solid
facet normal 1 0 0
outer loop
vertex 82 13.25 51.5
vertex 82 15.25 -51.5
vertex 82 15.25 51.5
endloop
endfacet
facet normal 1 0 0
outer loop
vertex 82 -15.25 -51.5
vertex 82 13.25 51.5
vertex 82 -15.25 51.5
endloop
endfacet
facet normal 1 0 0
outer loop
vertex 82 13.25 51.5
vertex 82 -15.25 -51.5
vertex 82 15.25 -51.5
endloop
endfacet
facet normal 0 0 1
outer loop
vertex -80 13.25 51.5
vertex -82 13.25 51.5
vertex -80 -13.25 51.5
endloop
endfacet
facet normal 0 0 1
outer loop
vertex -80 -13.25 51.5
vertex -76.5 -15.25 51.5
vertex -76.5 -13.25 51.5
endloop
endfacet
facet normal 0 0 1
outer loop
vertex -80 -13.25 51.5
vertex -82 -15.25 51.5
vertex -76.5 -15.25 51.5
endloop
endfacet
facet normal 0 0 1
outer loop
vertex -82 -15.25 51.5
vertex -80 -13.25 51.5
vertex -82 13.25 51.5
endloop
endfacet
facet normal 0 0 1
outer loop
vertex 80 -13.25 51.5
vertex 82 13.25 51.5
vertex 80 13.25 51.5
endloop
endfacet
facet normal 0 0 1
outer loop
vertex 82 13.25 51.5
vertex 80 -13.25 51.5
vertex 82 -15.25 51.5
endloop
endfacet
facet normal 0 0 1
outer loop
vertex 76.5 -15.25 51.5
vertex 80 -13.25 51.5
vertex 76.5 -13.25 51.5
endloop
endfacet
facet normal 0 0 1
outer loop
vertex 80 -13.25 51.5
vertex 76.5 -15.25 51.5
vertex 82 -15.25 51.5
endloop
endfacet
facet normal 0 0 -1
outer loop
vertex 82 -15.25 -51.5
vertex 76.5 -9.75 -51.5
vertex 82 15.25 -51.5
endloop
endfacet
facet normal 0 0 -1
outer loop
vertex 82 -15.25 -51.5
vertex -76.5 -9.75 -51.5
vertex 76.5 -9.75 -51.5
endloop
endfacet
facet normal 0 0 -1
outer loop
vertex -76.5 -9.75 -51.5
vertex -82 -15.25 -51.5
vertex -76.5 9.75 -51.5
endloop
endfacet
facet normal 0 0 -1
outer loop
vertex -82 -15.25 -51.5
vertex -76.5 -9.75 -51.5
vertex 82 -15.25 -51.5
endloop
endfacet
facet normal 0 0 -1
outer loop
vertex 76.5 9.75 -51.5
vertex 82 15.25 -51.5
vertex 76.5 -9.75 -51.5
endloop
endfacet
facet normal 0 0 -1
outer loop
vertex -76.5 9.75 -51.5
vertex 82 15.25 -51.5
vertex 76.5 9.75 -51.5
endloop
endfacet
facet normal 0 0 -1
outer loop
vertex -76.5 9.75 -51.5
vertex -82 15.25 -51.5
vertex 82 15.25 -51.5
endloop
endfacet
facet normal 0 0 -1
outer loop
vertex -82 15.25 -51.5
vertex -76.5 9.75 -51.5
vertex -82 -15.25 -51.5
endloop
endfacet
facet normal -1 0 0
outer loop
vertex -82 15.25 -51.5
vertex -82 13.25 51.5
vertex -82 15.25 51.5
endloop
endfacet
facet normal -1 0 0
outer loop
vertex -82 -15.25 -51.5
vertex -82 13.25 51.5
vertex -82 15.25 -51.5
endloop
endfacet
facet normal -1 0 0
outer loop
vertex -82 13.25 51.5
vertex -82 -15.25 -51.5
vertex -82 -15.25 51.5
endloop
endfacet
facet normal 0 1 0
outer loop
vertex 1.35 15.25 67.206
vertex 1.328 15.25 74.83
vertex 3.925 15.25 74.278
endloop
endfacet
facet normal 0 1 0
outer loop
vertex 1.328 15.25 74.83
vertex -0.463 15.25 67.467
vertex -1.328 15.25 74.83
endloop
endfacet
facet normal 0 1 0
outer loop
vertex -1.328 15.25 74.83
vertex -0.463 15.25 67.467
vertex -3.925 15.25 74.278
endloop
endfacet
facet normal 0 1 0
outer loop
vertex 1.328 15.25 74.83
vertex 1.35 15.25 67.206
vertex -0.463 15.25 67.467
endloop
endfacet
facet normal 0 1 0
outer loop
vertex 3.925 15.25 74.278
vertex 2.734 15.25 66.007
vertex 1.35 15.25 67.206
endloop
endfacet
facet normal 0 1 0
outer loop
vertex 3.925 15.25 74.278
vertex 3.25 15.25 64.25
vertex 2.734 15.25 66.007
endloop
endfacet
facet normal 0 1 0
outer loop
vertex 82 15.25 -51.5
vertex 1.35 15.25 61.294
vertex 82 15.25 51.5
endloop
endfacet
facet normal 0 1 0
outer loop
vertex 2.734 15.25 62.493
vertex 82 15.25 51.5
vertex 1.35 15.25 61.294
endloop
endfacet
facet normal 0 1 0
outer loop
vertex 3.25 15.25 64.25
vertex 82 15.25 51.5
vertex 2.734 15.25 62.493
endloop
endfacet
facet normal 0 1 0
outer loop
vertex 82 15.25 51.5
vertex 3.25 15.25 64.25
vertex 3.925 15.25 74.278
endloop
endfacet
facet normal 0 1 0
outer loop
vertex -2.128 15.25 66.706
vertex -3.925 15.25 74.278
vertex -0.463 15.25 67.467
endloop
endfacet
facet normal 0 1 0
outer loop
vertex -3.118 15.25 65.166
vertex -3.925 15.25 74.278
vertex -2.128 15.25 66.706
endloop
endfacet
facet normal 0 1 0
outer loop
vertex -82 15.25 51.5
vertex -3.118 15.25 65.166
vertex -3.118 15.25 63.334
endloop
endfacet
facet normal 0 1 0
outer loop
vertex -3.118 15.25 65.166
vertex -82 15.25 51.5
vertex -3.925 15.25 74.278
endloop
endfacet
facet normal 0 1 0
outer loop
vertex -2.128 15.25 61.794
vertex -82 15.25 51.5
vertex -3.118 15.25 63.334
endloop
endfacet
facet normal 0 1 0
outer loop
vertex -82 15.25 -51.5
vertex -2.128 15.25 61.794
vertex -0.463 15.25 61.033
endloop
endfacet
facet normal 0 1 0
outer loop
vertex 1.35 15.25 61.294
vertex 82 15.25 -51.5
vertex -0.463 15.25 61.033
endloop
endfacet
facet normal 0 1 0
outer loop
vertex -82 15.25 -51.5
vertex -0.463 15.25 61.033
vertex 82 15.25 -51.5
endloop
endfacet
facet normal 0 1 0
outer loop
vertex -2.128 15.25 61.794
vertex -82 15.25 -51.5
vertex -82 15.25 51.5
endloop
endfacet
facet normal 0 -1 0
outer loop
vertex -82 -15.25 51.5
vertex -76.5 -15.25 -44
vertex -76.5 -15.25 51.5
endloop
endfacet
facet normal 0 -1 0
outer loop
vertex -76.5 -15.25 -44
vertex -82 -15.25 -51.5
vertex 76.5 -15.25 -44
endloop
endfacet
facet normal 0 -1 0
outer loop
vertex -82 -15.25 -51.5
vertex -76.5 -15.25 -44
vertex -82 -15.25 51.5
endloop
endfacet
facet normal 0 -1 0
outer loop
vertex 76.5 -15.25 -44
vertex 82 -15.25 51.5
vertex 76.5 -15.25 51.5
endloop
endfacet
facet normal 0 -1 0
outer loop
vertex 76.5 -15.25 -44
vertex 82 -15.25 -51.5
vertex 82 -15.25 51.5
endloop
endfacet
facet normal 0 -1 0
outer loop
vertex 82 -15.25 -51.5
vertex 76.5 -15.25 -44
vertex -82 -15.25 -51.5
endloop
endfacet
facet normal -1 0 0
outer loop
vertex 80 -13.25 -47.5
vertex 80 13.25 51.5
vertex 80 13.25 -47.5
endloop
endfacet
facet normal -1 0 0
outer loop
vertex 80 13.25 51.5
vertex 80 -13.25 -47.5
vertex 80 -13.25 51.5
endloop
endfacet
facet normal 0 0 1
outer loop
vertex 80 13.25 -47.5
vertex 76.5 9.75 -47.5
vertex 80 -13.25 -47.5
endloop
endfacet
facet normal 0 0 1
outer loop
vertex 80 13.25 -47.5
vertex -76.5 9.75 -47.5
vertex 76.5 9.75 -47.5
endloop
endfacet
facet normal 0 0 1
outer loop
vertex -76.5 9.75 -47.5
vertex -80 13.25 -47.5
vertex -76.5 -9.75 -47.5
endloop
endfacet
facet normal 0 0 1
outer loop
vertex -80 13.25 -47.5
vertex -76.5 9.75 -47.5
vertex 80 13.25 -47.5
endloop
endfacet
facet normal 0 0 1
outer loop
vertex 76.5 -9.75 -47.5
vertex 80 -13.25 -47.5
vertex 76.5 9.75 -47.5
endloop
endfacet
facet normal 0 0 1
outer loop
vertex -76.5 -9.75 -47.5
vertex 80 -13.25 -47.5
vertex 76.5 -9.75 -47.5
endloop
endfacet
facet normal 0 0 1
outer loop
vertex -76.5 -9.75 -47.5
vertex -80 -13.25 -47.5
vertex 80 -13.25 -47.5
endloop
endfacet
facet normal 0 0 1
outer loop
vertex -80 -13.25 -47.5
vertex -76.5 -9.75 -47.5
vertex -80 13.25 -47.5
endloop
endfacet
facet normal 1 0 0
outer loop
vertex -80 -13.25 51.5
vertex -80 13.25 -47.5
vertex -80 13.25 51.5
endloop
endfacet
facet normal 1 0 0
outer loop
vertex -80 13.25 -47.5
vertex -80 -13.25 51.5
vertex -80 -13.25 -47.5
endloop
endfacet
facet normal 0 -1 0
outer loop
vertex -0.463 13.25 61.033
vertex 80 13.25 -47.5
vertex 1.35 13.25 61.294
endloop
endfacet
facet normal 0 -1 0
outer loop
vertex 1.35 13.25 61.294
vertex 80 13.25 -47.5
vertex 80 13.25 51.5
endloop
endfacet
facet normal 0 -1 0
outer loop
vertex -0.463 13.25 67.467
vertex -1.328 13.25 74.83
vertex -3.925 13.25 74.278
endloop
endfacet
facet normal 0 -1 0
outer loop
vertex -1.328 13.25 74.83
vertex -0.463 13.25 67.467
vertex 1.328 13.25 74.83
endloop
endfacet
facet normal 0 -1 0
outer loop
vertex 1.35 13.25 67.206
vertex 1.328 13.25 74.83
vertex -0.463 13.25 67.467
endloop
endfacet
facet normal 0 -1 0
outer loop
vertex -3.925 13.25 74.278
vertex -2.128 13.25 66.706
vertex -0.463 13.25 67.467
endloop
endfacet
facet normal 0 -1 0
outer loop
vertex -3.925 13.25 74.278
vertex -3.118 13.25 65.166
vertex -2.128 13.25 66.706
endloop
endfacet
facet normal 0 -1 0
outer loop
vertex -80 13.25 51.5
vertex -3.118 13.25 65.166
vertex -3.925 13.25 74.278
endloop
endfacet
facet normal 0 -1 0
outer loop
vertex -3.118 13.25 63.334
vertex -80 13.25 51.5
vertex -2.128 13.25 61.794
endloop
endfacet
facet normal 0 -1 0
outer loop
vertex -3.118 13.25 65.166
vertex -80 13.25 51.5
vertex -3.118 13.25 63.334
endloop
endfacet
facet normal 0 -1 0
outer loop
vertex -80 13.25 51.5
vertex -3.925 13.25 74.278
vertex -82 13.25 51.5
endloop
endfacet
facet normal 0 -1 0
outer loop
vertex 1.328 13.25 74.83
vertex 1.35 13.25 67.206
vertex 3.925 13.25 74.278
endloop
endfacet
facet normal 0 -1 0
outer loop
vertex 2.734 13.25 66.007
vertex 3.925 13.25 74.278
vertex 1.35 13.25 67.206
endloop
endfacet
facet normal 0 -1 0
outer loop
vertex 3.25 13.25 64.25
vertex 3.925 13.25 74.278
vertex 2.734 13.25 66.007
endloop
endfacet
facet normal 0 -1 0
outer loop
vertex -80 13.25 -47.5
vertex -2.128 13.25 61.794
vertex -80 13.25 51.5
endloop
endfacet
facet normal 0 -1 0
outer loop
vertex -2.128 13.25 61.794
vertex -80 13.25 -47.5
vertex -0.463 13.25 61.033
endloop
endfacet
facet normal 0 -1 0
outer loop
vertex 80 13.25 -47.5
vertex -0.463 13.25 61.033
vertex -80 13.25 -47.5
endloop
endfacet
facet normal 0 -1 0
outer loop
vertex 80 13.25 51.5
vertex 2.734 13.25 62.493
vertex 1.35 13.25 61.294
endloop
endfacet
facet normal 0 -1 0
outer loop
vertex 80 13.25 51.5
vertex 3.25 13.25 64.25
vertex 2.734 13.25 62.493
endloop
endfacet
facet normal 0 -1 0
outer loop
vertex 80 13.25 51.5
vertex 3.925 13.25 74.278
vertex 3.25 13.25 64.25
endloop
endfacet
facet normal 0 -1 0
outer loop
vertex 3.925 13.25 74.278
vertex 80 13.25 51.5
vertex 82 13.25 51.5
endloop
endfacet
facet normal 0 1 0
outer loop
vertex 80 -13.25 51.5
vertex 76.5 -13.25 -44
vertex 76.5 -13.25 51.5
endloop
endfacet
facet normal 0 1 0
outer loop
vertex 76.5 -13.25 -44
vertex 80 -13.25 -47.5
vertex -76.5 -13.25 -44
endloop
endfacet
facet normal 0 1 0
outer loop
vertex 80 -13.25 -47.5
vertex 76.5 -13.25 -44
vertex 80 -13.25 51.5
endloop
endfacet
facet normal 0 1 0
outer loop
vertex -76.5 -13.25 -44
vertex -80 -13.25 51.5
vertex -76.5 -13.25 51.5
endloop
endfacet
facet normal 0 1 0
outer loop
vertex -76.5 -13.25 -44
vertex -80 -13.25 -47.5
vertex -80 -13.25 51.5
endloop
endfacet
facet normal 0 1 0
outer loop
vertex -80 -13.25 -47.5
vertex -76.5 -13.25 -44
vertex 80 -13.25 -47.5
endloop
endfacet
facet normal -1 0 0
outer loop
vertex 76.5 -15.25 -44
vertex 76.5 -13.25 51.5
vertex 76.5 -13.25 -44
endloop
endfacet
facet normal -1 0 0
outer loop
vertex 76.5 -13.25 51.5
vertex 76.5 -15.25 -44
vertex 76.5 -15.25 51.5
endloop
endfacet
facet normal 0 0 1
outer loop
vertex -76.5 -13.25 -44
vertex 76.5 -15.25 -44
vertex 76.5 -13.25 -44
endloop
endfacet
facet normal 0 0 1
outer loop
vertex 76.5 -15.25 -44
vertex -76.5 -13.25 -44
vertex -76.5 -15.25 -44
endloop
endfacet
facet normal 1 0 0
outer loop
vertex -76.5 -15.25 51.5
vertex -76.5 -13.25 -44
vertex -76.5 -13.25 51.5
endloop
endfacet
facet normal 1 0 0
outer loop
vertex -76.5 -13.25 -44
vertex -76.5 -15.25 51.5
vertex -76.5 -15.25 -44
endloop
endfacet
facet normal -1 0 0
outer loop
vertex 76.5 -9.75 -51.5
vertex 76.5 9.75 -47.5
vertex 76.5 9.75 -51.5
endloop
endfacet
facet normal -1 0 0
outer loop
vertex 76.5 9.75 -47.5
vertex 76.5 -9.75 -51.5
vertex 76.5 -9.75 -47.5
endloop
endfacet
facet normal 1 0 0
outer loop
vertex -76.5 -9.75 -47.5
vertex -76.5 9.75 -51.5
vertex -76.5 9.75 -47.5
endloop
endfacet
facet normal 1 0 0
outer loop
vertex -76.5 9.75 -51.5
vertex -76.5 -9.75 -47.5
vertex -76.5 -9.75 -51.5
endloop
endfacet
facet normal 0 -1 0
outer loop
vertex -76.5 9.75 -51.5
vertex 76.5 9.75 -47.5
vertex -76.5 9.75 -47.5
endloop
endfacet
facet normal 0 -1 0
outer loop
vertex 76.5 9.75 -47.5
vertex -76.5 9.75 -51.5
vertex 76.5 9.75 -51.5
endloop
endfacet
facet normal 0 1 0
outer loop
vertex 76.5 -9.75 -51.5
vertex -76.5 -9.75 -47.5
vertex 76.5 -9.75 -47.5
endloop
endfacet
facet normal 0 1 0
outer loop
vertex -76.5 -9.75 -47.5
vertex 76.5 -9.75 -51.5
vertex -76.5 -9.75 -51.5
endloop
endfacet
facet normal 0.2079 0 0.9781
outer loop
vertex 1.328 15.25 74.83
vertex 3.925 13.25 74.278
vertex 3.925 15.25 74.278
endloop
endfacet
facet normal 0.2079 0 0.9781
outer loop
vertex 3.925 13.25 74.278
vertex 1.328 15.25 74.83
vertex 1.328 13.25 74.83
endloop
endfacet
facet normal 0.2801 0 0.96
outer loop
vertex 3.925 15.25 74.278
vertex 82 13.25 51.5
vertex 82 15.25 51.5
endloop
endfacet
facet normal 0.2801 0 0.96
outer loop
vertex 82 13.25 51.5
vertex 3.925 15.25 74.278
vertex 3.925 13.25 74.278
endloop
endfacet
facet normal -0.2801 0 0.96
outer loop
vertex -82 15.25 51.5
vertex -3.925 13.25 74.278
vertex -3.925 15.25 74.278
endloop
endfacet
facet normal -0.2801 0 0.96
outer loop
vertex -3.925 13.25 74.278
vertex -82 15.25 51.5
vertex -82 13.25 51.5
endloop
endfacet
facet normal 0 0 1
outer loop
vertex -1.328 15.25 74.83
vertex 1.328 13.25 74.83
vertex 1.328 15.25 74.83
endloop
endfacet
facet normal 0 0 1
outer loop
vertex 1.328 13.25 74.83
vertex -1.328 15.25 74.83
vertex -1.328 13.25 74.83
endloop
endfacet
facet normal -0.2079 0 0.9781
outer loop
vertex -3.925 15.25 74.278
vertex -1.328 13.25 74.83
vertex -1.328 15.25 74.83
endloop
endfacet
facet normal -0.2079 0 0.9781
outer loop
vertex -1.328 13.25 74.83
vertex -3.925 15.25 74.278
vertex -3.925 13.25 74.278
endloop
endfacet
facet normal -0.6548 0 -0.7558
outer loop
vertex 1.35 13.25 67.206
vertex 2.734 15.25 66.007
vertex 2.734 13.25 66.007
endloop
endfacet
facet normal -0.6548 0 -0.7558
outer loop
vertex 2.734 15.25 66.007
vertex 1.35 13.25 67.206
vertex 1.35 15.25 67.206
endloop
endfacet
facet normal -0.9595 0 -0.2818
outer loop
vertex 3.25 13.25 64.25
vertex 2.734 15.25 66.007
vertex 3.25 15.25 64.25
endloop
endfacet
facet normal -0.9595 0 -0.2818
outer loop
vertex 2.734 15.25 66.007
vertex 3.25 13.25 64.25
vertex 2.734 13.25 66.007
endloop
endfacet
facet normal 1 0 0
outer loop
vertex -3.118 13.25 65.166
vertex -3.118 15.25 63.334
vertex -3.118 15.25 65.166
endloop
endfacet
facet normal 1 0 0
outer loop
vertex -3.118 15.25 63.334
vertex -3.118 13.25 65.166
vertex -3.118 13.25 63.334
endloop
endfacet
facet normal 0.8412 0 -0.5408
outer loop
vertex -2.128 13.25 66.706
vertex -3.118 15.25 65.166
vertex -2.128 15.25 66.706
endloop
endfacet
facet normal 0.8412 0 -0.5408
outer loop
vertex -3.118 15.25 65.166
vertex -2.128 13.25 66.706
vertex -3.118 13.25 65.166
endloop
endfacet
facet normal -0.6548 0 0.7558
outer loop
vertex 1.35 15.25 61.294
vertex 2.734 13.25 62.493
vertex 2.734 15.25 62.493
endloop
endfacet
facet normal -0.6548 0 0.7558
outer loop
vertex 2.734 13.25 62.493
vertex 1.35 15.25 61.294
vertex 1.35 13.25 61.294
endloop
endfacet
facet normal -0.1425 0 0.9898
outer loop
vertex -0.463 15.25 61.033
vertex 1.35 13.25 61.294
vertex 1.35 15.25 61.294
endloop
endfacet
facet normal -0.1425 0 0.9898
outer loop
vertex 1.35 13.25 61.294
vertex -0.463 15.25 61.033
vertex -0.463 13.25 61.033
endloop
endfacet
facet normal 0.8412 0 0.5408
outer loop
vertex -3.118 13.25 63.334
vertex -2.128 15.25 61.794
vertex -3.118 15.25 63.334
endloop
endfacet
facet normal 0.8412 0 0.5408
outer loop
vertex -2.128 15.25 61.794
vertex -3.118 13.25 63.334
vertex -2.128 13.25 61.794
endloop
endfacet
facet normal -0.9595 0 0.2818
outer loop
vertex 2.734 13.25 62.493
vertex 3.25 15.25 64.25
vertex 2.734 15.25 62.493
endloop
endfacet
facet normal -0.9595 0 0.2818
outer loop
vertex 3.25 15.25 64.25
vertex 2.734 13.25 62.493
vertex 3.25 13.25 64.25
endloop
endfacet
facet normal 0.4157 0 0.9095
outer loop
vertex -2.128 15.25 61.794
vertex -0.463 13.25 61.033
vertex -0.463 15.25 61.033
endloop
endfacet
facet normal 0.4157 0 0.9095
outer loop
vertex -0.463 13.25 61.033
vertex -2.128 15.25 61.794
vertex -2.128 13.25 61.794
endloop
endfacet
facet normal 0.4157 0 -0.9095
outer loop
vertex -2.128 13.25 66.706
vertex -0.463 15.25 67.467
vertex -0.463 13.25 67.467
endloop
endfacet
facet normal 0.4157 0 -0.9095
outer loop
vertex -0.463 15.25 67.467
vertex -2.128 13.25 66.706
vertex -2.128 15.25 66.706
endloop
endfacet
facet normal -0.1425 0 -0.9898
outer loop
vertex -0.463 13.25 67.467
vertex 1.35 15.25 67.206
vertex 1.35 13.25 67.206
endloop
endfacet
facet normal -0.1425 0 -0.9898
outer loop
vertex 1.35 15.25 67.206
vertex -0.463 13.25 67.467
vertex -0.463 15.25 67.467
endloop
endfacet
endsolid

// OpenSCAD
//Streaming Device TV Mount

//by replayreb
//GPL License

//https://www.thingiverse.com/thing:3255257

//(in mm)
wall_thickness = 2;

mounting_hole_diameter = 6.5;

device_width = 160;
//(depth = length of device from front to back)
device_depth = 99;
device_height = 26.5;

//(Enter value greater than width of device if you want top completely enclosed)
top_bezel_width = 3.5;

//(Use if you want centered cutout for ports, otherwise enter value greater than width of device and customize cutout below) 
port_bezel_width = 3.5;

//(Use next four values to customize port cutout size and offset, otherwise zero these out)
port_cutout_width = 0;
port_cutout_height = 0;

//(experiment here to offset port cutout)
port_cutout_width_offset = 0;
port_cutout_height_offset = 0;

//Make mount
difference(){
	//Case
	cube([device_width+wall_thickness*2,device_height+wall_thickness*2,device_depth+wall_thickness*2], center = true);

	//Device cutout
	translate([0, 0, wall_thickness])
	cube([device_width,device_height,device_depth], center = true);

	//Top cutout
	translate([0, -device_height/2, top_bezel_width+wall_thickness])
	cube([device_width-top_bezel_width*2,device_height,device_depth], center = true);

	//Uniform port cutout using bezel value
    translate([0, 0, -device_depth/2])
	cube([device_width-port_bezel_width*2, device_height-port_bezel_width*2, device_depth], center = true);
    
    //Custom port cutout
	translate([port_cutout_width_offset, port_cutout_height_offset, -device_depth/2])
	cube([port_cutout_width,port_cutout_height,device_depth], center = true);
}

//Make mounting bracket
difference(){
    hull(){
        difference(){
            cube([device_width+wall_thickness*2,device_height+wall_thickness*2,device_depth+wall_thickness*2], center = true);

            translate([0, -wall_thickness, 0])
            cube([device_width+wall_thickness*2,device_height+wall_thickness*2,device_depth+wall_thickness*2], center = true);
        }

        difference(){
            translate([0, 0, device_depth/2+12.7])
            rotate([90, 0, 0])
            cylinder(device_height+wall_thickness*2, d=25.4, center = true);

            translate([0, -wall_thickness, device_depth/2])
            cube([device_width+wall_thickness*2,device_height+wall_thickness*2,device_depth+wall_thickness*2], center = true);
        }
    }

    translate([0, 0, device_depth/2+18-mounting_hole_diameter/2])
    rotate([90, 0, 0])
    cylinder(device_height*2, d=mounting_hole_diameter, center = true);
}
